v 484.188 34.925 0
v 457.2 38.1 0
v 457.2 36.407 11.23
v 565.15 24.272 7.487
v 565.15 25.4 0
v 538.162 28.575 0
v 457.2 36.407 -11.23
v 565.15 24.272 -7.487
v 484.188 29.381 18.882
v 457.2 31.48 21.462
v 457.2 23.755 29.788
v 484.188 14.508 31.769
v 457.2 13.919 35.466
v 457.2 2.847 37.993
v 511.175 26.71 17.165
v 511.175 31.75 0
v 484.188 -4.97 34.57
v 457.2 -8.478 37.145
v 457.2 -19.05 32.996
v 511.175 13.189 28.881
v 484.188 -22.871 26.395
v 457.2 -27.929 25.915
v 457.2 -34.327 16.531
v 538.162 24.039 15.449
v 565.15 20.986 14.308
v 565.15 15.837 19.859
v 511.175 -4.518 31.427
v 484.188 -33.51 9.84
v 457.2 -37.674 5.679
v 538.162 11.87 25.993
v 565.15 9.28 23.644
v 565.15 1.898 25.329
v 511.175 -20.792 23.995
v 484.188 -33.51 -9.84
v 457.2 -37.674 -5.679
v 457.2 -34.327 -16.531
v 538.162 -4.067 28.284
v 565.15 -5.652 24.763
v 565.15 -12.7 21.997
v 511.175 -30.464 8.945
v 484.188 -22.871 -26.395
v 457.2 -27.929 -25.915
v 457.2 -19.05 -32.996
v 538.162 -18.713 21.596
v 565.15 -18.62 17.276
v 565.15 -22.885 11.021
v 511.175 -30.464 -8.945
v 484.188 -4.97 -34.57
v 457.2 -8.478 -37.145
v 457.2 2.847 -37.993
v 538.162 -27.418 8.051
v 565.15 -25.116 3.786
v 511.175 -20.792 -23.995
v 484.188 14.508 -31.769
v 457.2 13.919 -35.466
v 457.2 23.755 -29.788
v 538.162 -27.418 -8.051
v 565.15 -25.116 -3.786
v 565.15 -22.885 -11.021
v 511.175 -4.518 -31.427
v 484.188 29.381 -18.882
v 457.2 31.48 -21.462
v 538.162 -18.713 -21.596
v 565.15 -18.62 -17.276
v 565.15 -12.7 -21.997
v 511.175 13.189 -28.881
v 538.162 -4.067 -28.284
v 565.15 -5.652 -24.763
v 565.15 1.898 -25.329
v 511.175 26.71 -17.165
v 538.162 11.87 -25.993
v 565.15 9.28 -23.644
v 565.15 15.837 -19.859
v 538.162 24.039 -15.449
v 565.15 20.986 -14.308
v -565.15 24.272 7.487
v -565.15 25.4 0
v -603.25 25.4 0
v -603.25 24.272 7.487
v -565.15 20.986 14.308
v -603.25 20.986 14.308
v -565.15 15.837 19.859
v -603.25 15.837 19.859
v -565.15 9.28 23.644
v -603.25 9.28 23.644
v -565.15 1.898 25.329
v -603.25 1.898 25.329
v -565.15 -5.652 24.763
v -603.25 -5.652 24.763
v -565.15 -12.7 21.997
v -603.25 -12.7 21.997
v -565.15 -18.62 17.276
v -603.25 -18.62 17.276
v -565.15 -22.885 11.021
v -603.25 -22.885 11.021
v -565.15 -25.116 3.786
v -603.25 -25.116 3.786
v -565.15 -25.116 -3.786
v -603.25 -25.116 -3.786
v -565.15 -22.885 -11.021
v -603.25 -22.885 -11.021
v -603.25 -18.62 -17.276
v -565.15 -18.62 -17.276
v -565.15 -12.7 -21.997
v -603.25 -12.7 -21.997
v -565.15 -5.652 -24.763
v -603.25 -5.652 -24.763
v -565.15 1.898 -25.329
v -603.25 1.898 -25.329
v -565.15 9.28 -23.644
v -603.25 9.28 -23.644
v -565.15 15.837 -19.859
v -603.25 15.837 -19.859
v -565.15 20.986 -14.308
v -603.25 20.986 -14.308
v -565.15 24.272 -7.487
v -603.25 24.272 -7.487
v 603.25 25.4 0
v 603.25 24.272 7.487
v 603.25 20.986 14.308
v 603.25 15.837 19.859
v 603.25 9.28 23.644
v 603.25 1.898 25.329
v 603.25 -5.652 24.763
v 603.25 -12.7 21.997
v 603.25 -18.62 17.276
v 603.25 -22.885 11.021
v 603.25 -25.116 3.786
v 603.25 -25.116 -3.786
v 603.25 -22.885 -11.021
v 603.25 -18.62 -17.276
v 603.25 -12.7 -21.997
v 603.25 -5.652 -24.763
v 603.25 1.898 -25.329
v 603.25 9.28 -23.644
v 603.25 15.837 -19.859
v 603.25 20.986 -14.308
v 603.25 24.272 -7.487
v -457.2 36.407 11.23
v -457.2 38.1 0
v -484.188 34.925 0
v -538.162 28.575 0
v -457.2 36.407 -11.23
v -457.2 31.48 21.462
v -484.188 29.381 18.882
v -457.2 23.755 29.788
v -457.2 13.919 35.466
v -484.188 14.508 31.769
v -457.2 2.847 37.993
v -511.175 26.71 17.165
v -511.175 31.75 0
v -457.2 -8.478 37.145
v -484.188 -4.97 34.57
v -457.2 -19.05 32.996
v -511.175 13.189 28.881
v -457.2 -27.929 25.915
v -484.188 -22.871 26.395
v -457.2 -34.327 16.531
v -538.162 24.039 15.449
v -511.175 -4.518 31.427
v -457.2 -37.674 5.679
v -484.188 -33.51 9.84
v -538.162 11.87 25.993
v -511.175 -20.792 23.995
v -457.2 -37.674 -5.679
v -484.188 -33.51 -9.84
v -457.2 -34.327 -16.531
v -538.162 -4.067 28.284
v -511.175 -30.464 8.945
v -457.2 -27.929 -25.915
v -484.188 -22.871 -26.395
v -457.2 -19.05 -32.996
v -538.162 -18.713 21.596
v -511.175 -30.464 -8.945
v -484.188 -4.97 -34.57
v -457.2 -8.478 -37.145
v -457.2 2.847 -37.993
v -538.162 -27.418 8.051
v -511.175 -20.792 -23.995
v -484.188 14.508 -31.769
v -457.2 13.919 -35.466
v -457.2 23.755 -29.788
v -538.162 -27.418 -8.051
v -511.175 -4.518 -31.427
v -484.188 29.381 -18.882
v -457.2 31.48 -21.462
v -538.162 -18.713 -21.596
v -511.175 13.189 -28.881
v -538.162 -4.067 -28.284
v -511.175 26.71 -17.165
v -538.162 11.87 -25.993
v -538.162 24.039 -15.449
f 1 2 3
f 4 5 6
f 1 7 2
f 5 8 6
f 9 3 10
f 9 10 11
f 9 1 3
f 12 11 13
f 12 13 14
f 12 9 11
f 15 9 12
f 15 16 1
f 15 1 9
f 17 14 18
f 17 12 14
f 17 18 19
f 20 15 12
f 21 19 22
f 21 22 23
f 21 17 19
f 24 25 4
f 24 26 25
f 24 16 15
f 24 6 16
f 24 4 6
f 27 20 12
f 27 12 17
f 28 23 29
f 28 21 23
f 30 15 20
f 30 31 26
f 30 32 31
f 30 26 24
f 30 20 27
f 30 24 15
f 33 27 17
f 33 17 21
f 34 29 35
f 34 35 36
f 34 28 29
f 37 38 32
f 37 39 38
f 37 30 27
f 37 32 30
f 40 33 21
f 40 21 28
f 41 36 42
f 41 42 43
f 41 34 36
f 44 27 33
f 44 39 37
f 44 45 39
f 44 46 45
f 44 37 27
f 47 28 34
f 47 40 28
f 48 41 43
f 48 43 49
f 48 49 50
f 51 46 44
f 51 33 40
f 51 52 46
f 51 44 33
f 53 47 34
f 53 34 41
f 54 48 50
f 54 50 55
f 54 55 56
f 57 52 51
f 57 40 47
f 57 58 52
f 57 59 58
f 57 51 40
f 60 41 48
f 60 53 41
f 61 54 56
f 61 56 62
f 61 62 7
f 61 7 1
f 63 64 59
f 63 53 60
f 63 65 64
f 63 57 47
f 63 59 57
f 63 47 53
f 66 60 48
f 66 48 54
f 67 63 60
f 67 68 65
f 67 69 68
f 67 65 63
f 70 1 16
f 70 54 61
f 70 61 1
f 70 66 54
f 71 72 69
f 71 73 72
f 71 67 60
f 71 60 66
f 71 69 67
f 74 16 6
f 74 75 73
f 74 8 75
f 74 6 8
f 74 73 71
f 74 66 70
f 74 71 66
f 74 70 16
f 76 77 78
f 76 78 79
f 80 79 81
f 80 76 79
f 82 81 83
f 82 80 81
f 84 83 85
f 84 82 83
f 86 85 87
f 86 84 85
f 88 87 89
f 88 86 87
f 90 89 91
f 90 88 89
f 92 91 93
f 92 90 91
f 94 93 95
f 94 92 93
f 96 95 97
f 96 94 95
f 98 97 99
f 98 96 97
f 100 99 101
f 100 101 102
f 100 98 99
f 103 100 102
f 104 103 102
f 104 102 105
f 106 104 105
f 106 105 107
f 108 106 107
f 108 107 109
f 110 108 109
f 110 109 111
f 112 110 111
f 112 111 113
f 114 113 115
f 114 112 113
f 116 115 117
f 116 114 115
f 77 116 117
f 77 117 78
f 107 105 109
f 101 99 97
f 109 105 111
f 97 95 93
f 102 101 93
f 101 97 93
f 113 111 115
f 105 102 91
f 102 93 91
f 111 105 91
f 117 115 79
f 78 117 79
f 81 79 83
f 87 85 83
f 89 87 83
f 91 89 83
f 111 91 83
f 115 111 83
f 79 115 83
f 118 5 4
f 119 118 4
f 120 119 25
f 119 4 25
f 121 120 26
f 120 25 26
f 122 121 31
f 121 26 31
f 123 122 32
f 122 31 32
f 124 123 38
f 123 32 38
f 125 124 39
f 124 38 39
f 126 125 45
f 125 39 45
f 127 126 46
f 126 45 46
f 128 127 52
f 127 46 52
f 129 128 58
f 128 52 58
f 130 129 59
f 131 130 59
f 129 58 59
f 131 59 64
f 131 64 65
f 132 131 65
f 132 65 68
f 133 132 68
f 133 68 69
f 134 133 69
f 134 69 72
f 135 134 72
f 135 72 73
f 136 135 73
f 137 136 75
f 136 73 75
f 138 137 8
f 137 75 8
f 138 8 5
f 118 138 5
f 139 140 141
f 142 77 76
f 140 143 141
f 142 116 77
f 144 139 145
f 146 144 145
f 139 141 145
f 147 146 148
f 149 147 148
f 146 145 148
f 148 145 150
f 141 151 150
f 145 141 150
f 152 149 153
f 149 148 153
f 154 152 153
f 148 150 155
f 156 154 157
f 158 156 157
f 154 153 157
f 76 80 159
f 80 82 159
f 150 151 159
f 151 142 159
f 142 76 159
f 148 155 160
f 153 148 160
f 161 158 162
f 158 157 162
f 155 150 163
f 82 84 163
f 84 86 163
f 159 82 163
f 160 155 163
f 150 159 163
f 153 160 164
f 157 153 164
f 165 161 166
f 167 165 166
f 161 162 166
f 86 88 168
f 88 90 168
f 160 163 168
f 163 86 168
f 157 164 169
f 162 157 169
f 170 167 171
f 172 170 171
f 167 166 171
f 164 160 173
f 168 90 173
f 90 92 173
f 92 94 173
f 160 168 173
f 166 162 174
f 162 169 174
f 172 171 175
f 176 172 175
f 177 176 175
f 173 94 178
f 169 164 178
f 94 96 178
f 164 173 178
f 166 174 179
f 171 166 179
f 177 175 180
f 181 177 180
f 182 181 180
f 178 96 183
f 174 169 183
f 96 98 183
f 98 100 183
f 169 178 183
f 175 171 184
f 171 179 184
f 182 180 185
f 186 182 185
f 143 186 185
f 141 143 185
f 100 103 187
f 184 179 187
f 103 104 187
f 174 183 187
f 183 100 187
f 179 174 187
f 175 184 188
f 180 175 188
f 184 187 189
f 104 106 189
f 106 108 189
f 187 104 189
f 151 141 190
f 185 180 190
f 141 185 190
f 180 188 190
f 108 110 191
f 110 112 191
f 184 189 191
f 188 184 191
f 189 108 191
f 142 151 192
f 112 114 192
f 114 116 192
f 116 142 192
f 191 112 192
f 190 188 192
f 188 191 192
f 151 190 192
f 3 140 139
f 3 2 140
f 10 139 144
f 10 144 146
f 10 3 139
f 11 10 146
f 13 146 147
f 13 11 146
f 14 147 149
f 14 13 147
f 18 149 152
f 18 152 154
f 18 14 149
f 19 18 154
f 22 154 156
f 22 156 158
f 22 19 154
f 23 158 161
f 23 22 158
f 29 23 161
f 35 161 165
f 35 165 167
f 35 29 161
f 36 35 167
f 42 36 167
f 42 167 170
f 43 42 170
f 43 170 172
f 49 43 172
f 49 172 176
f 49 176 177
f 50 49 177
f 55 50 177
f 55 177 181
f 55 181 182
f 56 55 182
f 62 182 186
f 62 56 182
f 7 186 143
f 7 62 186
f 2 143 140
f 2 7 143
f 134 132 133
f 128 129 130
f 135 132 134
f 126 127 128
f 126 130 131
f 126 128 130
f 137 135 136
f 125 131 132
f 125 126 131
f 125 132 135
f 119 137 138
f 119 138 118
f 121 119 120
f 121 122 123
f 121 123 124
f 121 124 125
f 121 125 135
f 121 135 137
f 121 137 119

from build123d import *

# Parameters (mm, degrees)
F0_R      = 38.1
F1_DEPTH  = 457.2
F3_R      = 25.4
F4_DEPTH  = 38.1
F1_FACE_R = 38.1
F4_FACE_R = 25.4


with BuildPart() as f1:
    # F0 (on Right) → F1 (new body, symmetric)
    with BuildSketch(Plane.YZ):
        Circle(F0_R)
    extrude(amount=F1_DEPTH, both=True)



with BuildPart() as f4:
    # F3 (on offset) → F4 (new body)
    with BuildSketch(Plane.YZ.offset(565.15)):
        Circle(F3_R)
    extrude(amount=F4_DEPTH)


with BuildPart() as f1_1:
    add(f1.part)

    add(f4.part)  # F5 merges F4
    # F1_face (on face) → F5 section 0
    with BuildSketch(Plane.YZ.offset(457.2)):
        Circle(F1_FACE_R)
    # F4_face (on face) → F5 section 1
    with BuildSketch(Plane(origin=(565.15, 0, 0), x_dir=(0, 1, 0), z_dir=(-1, 0, 0))):
        Circle(F4_FACE_R)
    loft()

    # F6: F1 across plane


with BuildPart() as f1_2:
    add(f1_1.part)
    add(f1_1.part.mirror(Plane.YZ))


solid = f1_2.part
